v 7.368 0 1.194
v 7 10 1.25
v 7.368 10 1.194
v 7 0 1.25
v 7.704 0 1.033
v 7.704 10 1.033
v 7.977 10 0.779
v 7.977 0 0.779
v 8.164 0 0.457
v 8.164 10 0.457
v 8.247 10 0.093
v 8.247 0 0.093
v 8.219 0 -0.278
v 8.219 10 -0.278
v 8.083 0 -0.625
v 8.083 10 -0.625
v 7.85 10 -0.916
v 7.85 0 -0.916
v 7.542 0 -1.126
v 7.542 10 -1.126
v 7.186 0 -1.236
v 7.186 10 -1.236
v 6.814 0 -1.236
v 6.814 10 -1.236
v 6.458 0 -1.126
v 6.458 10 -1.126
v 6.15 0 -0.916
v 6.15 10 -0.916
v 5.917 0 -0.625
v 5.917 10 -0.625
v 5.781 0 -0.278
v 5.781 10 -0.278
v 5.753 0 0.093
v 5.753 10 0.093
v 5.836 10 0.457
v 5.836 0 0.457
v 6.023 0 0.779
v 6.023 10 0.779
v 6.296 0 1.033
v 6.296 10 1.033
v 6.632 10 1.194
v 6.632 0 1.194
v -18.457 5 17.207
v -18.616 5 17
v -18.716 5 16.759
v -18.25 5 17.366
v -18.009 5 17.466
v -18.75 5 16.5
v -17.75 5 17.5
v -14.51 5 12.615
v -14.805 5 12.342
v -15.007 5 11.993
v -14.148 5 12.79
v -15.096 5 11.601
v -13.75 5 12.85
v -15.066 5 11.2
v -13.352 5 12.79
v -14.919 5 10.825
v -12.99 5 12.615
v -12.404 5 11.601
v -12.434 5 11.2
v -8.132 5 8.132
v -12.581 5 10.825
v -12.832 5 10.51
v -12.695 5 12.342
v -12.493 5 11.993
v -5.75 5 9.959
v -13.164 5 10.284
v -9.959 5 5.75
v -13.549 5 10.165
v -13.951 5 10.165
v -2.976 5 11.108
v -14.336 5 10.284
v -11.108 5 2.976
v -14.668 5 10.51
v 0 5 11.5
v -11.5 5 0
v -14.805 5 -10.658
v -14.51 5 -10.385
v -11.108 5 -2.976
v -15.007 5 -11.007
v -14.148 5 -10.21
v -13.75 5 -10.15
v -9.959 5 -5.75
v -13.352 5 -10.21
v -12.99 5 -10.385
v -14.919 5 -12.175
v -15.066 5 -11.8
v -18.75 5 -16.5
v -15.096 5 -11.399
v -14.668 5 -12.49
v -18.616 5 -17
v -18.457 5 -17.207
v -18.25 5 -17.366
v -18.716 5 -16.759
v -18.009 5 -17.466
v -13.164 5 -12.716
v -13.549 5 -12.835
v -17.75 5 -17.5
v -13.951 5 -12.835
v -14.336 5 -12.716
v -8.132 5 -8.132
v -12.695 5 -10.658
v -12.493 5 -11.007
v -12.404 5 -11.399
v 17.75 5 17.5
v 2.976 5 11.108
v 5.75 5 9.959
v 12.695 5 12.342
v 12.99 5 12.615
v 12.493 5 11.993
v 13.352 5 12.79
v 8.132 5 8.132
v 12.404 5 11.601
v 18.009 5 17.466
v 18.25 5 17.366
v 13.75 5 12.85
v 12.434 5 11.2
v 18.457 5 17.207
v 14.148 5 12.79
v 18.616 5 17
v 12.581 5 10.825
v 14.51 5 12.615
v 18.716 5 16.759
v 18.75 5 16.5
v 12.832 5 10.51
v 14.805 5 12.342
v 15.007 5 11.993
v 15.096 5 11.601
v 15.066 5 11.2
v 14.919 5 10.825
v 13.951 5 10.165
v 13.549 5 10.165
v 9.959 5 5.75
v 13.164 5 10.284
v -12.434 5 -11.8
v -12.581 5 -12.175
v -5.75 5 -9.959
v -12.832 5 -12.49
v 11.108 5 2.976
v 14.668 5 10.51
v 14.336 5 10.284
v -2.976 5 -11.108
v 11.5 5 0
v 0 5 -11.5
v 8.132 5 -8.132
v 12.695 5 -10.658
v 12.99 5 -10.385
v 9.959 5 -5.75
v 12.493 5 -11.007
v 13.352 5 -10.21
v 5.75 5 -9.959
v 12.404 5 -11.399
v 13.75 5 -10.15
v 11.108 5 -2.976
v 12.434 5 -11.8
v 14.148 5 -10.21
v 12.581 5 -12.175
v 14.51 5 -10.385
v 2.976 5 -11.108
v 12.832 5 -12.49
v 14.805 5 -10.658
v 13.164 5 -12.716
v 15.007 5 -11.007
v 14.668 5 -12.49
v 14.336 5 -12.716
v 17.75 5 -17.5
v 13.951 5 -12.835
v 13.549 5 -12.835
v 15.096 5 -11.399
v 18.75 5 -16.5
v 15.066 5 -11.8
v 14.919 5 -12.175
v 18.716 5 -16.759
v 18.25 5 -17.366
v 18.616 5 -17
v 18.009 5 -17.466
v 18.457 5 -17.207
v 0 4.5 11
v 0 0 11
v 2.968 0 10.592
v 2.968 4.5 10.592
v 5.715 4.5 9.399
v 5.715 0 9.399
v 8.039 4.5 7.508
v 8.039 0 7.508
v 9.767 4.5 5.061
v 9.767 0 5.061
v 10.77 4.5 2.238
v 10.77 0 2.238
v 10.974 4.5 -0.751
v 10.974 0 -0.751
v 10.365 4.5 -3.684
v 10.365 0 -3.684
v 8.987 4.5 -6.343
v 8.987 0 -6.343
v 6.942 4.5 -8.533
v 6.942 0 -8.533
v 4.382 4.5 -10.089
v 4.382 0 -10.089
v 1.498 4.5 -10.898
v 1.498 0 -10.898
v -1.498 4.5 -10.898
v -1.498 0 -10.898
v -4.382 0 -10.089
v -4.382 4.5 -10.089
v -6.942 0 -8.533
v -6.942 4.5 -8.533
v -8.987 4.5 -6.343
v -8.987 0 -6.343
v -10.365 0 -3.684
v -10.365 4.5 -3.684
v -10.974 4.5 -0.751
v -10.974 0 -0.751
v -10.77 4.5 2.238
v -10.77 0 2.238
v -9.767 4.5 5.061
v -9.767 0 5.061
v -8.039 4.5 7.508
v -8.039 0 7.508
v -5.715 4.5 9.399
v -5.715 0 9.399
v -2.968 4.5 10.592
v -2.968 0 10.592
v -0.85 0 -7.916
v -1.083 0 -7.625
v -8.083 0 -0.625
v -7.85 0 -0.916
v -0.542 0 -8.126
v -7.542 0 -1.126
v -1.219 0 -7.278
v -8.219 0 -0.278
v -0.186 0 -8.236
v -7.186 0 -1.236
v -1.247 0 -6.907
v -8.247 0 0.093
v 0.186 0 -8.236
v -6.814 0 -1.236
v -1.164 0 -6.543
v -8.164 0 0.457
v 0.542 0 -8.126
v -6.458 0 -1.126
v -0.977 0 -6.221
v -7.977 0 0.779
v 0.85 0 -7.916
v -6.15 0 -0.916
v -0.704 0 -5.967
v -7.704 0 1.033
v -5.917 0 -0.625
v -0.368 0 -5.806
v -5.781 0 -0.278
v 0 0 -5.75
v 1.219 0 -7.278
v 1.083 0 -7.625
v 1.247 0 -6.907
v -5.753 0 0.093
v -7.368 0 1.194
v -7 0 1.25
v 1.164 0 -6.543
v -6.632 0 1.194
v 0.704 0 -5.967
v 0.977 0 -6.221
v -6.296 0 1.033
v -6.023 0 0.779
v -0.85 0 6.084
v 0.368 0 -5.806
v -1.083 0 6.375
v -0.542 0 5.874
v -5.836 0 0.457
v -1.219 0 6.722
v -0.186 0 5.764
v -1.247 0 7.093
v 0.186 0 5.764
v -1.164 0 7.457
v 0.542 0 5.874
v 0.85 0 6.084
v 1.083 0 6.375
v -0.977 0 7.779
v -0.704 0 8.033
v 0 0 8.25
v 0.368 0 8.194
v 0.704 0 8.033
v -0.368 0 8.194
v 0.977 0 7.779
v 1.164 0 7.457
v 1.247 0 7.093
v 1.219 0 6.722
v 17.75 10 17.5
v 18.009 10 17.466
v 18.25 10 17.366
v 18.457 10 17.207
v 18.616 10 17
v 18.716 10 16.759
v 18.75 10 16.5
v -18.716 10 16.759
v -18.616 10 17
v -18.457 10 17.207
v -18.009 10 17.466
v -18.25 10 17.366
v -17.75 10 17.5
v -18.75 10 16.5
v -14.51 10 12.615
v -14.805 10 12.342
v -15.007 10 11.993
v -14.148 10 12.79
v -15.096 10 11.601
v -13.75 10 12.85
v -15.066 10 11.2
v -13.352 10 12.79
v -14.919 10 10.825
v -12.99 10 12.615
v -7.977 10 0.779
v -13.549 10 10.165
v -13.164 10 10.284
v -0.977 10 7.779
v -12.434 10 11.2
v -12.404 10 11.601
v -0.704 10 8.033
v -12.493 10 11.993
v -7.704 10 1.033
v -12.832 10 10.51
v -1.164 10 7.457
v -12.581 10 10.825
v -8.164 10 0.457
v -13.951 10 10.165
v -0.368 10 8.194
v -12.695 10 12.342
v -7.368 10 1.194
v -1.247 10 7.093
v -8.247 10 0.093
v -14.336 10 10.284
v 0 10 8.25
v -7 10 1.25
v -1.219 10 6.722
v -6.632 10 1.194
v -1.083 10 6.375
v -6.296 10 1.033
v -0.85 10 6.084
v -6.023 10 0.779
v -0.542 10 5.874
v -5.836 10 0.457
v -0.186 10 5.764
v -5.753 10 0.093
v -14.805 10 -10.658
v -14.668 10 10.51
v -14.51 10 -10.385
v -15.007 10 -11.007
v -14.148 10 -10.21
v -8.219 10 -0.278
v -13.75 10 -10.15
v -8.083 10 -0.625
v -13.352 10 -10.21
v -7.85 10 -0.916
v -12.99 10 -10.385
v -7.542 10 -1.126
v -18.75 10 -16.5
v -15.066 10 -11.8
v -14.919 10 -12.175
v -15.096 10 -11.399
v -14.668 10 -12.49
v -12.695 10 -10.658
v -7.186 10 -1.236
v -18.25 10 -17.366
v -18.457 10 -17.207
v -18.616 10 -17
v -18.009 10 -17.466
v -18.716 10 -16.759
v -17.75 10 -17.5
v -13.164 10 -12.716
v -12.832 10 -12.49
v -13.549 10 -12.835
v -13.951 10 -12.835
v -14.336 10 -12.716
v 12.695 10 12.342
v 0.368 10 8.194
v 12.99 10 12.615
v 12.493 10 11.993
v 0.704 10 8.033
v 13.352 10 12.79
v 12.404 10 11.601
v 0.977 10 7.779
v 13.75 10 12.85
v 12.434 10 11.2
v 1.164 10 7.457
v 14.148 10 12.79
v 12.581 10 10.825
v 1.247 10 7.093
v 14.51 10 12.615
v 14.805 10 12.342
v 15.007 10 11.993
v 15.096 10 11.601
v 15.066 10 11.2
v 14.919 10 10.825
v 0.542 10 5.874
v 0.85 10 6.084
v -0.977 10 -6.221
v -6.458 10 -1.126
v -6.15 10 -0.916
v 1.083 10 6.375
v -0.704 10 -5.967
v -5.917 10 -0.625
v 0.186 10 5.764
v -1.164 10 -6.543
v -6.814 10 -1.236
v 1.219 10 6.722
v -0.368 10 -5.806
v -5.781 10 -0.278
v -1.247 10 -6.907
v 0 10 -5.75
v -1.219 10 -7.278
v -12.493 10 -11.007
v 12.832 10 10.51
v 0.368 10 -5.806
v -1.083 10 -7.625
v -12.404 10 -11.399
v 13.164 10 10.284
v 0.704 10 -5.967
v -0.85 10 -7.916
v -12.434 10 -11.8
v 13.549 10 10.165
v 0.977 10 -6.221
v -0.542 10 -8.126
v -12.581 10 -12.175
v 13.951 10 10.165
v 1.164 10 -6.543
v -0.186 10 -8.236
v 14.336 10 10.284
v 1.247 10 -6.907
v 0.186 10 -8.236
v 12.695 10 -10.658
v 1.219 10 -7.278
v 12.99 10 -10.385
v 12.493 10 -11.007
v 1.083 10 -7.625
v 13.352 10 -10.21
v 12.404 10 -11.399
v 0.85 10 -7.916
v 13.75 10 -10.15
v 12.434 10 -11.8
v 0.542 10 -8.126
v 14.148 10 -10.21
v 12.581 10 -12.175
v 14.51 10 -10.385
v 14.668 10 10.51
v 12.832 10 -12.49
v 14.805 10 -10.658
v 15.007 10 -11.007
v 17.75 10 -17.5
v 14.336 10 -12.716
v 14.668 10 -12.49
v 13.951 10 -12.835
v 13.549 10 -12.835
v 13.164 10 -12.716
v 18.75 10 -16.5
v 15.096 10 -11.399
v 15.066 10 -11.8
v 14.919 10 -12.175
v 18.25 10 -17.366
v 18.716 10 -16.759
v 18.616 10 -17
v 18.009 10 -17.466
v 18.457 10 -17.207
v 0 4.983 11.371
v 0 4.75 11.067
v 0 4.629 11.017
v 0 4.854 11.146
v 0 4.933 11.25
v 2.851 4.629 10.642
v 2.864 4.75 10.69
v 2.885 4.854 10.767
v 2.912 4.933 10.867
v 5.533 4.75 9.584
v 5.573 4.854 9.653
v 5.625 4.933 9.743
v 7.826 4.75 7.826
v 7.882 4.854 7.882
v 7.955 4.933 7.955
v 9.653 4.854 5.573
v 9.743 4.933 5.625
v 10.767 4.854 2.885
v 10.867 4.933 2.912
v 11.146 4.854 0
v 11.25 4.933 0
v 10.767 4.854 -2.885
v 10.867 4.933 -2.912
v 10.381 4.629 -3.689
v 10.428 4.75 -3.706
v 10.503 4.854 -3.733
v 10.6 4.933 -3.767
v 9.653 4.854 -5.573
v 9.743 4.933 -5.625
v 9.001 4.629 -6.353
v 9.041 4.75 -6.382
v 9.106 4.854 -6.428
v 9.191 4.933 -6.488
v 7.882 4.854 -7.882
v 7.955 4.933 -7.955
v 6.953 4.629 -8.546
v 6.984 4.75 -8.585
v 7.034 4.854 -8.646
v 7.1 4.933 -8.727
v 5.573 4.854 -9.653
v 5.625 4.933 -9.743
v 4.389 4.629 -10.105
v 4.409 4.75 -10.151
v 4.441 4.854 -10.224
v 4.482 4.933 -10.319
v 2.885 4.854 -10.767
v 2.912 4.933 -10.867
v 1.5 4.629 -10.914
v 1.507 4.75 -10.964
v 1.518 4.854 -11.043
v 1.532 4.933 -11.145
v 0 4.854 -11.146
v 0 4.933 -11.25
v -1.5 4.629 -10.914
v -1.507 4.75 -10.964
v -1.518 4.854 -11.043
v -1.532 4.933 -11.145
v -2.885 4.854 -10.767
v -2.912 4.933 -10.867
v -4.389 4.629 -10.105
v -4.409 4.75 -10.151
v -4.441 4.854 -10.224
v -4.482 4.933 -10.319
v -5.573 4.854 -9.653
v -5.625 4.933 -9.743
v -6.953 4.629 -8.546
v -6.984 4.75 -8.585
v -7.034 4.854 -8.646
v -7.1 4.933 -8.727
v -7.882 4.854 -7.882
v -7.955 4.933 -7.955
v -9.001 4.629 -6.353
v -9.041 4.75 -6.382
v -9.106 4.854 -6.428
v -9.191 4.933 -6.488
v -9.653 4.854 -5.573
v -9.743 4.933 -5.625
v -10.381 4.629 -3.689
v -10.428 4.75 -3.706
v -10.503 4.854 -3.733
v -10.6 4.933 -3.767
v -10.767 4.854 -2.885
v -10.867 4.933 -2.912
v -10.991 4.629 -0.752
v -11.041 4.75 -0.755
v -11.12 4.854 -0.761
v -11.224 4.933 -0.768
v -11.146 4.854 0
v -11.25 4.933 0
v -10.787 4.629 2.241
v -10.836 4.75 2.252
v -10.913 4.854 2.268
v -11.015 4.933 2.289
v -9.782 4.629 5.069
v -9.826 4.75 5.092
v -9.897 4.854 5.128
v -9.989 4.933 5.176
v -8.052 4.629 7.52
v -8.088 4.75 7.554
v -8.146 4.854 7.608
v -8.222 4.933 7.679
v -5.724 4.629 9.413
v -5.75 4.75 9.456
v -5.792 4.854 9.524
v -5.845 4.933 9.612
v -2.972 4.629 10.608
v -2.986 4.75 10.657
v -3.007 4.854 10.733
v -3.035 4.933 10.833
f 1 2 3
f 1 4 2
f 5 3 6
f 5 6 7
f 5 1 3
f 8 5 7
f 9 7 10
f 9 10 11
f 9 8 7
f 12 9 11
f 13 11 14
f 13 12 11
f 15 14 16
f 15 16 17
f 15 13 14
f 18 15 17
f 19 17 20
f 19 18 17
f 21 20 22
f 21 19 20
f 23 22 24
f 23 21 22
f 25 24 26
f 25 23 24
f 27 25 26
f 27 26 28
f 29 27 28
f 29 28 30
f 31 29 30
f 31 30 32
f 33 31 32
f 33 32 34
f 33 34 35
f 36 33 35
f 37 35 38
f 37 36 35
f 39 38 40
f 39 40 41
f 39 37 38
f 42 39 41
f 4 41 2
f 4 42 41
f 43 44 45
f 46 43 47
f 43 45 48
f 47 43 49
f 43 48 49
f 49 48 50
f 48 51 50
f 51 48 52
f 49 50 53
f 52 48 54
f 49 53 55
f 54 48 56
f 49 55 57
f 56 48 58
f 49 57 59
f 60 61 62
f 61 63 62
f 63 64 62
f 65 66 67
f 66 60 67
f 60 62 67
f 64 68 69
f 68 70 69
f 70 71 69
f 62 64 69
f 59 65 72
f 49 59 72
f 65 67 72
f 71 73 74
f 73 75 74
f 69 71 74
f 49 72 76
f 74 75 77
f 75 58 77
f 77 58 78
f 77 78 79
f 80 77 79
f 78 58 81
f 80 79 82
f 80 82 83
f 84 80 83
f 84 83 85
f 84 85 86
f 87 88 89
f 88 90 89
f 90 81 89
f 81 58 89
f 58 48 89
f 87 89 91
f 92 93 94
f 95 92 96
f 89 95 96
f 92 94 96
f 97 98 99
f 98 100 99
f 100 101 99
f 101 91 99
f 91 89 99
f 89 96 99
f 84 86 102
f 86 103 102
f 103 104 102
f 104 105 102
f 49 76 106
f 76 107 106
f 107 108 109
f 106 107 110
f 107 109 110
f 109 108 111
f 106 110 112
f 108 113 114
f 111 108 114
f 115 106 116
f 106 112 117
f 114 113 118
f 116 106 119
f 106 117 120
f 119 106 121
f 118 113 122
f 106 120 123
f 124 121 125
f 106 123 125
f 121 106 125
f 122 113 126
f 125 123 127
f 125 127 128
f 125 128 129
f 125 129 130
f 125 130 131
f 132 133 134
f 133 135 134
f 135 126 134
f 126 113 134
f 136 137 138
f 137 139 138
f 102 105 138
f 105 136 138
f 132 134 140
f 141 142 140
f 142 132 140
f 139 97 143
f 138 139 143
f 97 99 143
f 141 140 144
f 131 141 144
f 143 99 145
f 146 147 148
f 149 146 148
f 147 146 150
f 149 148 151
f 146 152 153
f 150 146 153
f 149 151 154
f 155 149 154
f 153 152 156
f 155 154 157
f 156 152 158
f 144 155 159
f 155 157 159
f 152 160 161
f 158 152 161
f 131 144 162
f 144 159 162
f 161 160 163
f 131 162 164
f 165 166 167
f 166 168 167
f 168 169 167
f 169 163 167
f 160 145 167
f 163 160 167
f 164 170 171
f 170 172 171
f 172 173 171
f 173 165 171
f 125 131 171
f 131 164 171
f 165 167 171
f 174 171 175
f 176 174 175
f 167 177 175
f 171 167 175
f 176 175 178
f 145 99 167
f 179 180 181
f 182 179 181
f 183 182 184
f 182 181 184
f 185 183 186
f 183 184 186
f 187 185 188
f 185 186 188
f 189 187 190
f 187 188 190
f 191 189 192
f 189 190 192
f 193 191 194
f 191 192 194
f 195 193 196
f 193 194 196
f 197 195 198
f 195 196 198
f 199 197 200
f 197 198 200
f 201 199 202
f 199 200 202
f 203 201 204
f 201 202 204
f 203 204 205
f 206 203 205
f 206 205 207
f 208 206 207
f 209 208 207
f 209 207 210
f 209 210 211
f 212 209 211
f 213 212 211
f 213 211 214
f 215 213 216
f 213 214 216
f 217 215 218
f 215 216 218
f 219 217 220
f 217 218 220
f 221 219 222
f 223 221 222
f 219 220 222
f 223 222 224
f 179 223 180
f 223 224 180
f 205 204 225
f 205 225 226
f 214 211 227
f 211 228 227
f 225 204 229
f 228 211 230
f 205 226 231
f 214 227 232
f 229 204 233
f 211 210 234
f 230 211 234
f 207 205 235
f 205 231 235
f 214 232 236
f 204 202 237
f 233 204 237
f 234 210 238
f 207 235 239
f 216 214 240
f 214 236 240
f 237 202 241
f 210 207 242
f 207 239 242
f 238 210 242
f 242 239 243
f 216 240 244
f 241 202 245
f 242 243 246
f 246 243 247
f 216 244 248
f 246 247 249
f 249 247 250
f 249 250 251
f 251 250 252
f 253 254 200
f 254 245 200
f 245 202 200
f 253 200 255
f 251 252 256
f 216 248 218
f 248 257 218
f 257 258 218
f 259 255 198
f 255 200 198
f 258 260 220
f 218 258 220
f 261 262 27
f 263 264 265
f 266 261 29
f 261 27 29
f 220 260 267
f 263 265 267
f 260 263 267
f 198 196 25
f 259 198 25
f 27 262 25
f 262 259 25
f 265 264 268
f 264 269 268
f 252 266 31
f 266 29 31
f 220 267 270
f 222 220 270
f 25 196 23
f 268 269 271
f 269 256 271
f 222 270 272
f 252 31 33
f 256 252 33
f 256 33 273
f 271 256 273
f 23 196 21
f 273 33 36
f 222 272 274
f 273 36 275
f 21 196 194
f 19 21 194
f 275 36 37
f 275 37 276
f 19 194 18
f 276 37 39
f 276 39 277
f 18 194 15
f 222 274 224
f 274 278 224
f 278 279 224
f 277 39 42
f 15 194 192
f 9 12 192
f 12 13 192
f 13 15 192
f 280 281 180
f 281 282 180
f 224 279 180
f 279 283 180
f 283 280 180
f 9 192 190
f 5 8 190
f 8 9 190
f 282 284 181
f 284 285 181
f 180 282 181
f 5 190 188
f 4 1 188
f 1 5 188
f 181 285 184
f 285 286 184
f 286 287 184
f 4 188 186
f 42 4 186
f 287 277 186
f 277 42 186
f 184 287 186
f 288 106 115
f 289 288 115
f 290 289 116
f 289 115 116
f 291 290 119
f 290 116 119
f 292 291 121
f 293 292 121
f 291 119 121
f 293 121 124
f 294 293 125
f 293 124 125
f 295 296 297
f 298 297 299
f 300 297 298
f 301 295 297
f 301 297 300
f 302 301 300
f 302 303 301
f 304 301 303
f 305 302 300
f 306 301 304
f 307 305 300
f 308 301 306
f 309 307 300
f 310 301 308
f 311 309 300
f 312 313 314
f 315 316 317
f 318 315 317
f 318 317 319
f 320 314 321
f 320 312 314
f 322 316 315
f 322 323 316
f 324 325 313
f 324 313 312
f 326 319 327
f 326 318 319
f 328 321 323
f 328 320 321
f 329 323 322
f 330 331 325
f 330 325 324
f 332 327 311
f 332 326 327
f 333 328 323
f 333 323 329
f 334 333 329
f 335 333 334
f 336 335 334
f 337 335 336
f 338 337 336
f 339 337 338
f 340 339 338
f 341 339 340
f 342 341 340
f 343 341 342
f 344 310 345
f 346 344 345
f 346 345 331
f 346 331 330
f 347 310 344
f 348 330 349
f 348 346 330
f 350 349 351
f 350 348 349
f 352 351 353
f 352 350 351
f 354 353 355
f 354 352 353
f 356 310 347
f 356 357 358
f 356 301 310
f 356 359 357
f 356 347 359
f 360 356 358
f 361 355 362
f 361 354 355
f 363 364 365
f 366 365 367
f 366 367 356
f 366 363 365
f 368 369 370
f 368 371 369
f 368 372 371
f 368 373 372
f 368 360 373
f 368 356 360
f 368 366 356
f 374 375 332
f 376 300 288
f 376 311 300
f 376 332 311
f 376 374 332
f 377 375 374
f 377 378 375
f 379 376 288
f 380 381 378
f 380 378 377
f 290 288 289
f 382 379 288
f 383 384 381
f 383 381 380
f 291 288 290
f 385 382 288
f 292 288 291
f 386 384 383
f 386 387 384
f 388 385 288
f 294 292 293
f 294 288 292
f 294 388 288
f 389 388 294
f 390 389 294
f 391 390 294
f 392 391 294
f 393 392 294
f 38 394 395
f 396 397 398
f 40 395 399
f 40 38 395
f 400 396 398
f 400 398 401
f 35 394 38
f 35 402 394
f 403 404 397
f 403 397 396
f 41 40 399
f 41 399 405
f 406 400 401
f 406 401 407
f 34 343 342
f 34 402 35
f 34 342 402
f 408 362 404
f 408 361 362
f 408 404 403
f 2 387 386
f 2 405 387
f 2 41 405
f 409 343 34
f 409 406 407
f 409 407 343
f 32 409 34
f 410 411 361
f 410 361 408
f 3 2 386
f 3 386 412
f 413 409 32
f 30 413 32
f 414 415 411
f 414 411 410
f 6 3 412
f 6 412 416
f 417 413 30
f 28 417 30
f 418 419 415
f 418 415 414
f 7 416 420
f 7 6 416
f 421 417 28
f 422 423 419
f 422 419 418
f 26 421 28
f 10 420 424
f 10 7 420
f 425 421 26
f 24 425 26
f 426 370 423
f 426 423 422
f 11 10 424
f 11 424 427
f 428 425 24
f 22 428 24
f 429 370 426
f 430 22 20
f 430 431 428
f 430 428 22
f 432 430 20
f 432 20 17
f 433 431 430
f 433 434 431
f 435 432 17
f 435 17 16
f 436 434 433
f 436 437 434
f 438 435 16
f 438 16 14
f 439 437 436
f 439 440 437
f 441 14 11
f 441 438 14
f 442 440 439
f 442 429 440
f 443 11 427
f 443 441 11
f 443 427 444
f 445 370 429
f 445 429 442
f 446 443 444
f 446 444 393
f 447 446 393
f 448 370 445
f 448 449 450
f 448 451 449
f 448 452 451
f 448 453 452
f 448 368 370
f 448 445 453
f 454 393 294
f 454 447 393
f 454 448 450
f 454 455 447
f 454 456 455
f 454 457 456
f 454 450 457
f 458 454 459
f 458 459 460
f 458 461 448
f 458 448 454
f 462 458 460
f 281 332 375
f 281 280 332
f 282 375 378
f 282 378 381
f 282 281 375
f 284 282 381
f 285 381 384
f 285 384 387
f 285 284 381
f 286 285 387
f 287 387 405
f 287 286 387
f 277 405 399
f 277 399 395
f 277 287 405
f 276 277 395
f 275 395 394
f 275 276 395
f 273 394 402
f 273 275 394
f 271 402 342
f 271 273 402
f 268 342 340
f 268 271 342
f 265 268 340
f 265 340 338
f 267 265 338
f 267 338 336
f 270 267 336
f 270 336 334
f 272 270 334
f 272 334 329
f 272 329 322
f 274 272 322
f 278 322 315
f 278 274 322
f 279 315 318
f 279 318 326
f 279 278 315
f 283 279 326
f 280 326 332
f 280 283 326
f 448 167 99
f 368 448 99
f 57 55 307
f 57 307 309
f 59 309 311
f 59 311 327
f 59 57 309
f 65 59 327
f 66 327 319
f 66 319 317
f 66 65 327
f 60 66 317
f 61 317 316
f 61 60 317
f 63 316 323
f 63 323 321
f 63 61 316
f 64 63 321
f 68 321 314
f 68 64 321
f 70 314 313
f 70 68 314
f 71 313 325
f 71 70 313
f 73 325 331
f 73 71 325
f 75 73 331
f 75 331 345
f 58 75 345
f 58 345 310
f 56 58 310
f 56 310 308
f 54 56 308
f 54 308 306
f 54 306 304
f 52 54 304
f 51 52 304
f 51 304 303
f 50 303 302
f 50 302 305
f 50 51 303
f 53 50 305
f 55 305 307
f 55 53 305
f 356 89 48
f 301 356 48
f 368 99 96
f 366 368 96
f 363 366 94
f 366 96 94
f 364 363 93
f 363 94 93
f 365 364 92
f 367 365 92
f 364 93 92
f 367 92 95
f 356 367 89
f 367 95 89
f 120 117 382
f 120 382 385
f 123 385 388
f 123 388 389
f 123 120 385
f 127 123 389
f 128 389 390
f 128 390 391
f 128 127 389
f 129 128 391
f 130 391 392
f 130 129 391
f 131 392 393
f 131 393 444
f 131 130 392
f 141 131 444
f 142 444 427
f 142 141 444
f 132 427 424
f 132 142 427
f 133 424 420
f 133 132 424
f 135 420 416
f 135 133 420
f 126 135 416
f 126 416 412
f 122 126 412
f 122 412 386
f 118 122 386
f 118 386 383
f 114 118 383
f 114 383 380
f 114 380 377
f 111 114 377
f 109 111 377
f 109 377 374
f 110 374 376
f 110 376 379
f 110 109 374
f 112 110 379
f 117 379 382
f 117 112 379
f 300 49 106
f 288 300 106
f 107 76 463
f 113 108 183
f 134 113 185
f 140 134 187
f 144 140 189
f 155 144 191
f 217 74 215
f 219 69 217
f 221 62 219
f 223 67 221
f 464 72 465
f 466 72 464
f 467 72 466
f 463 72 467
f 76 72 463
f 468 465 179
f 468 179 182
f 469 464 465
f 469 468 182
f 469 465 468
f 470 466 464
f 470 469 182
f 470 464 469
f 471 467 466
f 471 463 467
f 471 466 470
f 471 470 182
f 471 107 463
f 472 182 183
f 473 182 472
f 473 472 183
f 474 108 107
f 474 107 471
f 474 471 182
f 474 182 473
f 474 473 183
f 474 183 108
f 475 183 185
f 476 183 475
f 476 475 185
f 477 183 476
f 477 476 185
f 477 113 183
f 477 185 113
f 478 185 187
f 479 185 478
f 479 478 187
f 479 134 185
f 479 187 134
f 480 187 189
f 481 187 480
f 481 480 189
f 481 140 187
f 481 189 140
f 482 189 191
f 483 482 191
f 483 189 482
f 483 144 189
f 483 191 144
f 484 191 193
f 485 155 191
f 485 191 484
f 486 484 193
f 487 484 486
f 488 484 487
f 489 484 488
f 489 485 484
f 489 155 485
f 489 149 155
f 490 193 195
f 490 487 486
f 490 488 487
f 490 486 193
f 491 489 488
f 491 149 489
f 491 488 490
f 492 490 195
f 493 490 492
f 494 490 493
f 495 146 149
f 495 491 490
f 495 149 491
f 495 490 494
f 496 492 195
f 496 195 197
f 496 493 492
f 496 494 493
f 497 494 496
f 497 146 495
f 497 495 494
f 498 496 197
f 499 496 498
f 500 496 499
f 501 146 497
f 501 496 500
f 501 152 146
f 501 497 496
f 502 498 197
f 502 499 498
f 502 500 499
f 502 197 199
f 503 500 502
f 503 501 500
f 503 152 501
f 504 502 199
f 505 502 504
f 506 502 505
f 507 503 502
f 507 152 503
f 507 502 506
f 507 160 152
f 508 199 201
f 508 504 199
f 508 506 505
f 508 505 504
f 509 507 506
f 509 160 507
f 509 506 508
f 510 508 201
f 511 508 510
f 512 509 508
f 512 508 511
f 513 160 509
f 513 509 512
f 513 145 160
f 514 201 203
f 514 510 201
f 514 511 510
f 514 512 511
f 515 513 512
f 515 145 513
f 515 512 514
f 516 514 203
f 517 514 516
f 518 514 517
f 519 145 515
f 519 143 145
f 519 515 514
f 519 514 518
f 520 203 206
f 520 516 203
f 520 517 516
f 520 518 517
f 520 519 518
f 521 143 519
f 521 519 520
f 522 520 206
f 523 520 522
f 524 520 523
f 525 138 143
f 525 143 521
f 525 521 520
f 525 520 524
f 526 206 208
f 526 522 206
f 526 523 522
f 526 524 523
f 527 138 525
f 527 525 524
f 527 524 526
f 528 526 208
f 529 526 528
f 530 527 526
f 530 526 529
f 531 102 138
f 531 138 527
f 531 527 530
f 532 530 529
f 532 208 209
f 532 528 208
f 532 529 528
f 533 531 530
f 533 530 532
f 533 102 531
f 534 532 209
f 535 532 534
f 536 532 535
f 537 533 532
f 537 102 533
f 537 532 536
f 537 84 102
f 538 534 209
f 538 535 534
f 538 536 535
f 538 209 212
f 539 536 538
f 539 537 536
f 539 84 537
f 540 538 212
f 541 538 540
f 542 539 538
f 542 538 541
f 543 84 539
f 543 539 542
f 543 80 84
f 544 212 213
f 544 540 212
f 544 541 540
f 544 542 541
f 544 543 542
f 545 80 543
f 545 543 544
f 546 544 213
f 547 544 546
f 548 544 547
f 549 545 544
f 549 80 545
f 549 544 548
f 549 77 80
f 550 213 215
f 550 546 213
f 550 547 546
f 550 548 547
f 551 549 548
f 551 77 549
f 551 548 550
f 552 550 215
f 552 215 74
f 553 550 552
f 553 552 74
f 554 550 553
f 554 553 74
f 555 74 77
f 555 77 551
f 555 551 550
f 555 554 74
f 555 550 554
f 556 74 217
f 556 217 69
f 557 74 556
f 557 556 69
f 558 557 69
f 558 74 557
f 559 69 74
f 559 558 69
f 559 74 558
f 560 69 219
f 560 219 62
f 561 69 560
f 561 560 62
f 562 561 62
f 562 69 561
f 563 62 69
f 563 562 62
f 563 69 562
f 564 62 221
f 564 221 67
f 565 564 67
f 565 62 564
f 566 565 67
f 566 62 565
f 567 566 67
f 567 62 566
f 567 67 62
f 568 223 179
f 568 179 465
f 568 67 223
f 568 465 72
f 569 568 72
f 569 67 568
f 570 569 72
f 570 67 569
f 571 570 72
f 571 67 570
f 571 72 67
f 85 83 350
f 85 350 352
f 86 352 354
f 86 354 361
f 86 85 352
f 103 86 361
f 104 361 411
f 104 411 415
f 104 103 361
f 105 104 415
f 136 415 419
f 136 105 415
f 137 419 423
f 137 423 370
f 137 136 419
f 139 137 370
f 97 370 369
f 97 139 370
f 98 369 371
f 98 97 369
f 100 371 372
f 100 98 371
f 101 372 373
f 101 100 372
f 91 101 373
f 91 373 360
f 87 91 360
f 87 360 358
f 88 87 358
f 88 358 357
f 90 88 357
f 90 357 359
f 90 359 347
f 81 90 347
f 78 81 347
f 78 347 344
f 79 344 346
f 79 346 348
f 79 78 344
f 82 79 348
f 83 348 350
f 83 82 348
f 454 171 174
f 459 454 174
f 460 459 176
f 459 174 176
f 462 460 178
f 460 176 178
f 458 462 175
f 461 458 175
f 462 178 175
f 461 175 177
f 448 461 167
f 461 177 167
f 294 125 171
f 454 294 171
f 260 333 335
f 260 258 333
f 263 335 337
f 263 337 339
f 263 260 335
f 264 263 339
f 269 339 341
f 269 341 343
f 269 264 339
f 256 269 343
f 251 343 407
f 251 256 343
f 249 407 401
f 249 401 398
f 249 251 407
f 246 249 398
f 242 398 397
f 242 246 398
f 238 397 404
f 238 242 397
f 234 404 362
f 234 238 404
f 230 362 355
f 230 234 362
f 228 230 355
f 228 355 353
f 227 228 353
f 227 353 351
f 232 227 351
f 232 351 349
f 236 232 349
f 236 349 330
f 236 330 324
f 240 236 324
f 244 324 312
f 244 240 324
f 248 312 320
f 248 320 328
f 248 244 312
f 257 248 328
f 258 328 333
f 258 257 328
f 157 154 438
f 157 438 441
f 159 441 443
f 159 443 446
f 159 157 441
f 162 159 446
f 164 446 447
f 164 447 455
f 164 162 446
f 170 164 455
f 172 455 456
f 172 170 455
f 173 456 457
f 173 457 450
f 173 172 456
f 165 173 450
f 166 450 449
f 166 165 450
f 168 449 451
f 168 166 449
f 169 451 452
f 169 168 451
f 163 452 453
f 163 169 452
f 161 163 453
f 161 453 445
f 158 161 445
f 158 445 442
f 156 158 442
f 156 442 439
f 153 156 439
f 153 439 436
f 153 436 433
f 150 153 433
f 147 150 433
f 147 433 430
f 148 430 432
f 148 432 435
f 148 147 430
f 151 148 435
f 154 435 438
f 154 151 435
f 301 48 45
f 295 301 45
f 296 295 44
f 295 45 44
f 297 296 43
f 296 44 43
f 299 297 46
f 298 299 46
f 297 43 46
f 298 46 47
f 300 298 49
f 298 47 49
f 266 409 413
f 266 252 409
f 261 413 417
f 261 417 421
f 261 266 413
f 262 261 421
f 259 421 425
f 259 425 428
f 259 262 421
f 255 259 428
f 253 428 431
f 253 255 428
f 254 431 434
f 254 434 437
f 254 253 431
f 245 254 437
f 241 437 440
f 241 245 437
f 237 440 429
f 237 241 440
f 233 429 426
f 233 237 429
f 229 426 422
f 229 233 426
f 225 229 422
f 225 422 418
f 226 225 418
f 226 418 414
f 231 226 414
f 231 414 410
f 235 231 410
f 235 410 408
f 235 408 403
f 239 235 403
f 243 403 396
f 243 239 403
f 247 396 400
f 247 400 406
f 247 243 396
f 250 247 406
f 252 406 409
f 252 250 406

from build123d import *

# Parameters (mm, degrees)
SKETCH1_R           = 11
SKETCH1_R_2         = 1.25
BOSS_EXTRUDE1_DEPTH = 5
SKETCH2_R           = 1.35
SKETCH2_R_2         = 1.25
BOSS_EXTRUDE2_DEPTH = 5
FILLET1_R           = 0.5


with BuildPart() as part:
    # Sketch1 → Boss-Extrude1 (new body)
    with BuildSketch(Plane(origin=(0, 0, 0), x_dir=(1, 0, 0), z_dir=(0, 1, 0))):
        with Locations(Location((0, 0, 0), (0, 0, 270))):
            Circle(SKETCH1_R)
        with Locations(Location((0, 7, 0), (0, 0, 270))):
            Circle(SKETCH1_R_2, mode=Mode.SUBTRACT)
        with Locations(Location((7, 0, 0), (0, 0, 270))):
            Circle(SKETCH1_R_2, mode=Mode.SUBTRACT)
        with Locations(Location((0, -7, 0), (0, 0, 270))):
            Circle(SKETCH1_R_2, mode=Mode.SUBTRACT)
        with Locations(Location((-7, 0, 0), (0, 0, 270))):
            Circle(SKETCH1_R_2, mode=Mode.SUBTRACT)
    extrude(amount=BOSS_EXTRUDE1_DEPTH)

    # Sketch2 → Boss-Extrude2 (add)
    with BuildSketch(Plane(origin=(0, 5, 0), x_dir=(1, 0, 0), z_dir=(0, 1, 0))):
        with BuildLine():
            ThreePointArc((-18.75, -16.5), (-18.457106781, -17.207106781), (-17.75, -17.5))
            Line((-17.75, -17.5), (17.75, -17.5))
            ThreePointArc((17.75, -17.5), (18.457106781, -17.207106781), (18.75, -16.5))
            Line((18.75, -16.5), (18.75, 16.5))
            ThreePointArc((18.75, 16.5), (18.457106781, 17.207106781), (17.75, 17.5))
            Line((17.75, 17.5), (-17.75, 17.5))
            ThreePointArc((-17.75, 17.5), (-18.457106781, 17.207106781), (-18.75, 16.5))
            Line((-18.75, 16.5), (-18.75, -16.5))
        make_face()
        with Locations(Location((-13.75, -11.5, 0), (0, 0, 270))):
            Circle(SKETCH2_R, mode=Mode.SUBTRACT)
        with Locations(Location((13.75, -11.5, 0), (0, 0, 270))):
            Circle(SKETCH2_R, mode=Mode.SUBTRACT)
        with Locations(Location((-13.75, 11.5, 0), (0, 0, 270))):
            Circle(SKETCH2_R, mode=Mode.SUBTRACT)
        with Locations(Location((13.75, 11.5, 0), (0, 0, 270))):
            Circle(SKETCH2_R, mode=Mode.SUBTRACT)
        with Locations(Location((0, 7, 0), (0, 0, 270))):
            Circle(SKETCH2_R_2, mode=Mode.SUBTRACT)
        with Locations(Location((0, -7, 0), (0, 0, 270))):
            Circle(SKETCH2_R_2, mode=Mode.SUBTRACT)
        with Locations(Location((-7, 0, 0), (0, 0, 270))):
            Circle(SKETCH2_R_2, mode=Mode.SUBTRACT)
        with Locations(Location((7, 0, 0), (0, 0, 270))):
            Circle(SKETCH2_R_2, mode=Mode.SUBTRACT)
    extrude(amount=BOSS_EXTRUDE2_DEPTH)

    # Fillet1
    fillet1_edges = [part.edges().sort_by_distance(p)[0] for p in [
        (0, 5, -11),
    ]]
    fillet(fillet1_edges, radius=FILLET1_R)


solid = part.part
